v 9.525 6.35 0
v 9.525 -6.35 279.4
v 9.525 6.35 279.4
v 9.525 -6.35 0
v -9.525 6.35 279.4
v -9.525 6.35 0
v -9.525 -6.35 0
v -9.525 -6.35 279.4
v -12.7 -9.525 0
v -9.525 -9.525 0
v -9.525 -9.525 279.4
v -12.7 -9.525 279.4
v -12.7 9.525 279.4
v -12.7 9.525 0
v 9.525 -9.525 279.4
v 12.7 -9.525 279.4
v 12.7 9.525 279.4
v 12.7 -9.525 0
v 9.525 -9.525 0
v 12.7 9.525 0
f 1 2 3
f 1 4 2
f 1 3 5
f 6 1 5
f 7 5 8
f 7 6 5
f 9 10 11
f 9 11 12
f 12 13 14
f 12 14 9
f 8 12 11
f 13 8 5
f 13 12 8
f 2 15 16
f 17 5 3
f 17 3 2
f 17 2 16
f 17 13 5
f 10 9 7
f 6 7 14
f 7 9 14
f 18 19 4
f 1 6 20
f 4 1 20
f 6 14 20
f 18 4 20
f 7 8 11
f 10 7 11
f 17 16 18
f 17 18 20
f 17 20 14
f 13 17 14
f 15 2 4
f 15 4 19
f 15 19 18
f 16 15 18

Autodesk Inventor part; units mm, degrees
ref_plane "YZ Plane" through (0, 0, 0) normal (1, 0, 0) x (0, 1, 0)
ref_plane "XZ Plane" through (0, 0, 0) normal (0, 1, 0) x (-1, 0, 0)
ref_plane "XY Plane" through (0, 0, 0) normal (0, 0, 1) x (1, 0, 0)
sketch "Sketch1" plane through (0, 0, 0) normal (0, 0, 1) x (1, 0, 0)
  line L0 (12.7, -9.525) -> (12.7, 9.525)
  line L1 (12.7, 9.525) -> (-12.7, 9.525)
  line L2 (-12.7, 9.525) -> (-12.7, -9.525)
  line L3 (-12.7, -9.525) -> (12.7, 9.525) construction
  line L4 (12.7, -9.525) -> (-12.7, 9.525) construction
  line L5 (9.525, -6.35) -> (9.525, 6.35)
  line L6 (9.525, 6.35) -> (-9.525, 6.35)
  line L7 (-9.525, 6.35) -> (-9.525, -6.35)
  line L8 (-9.525, -6.35) -> (9.525, 6.35) construction
  line L9 (9.525, -6.35) -> (-9.525, 6.35) construction
  line L10 (-9.525, -6.35) -> (-9.525, -9.525)
  line L11 (-9.525, -9.525) -> (-12.7, -9.525)
  line L12 (9.525, -6.35) -> (9.525, -9.525)
  line L13 (9.525, -9.525) -> (12.7, -9.525)
  point P0 (0, 0)
  dimension "d0" = 25.4
  dimension "d1" = 19.05
  dimension "d4" = 19.05
  dimension "d5" = 12.7
  dimension "d6" = 90
extrude "Extrusion2" add sketch "Sketch1" along normal blind 279.4
properties part number "case"
